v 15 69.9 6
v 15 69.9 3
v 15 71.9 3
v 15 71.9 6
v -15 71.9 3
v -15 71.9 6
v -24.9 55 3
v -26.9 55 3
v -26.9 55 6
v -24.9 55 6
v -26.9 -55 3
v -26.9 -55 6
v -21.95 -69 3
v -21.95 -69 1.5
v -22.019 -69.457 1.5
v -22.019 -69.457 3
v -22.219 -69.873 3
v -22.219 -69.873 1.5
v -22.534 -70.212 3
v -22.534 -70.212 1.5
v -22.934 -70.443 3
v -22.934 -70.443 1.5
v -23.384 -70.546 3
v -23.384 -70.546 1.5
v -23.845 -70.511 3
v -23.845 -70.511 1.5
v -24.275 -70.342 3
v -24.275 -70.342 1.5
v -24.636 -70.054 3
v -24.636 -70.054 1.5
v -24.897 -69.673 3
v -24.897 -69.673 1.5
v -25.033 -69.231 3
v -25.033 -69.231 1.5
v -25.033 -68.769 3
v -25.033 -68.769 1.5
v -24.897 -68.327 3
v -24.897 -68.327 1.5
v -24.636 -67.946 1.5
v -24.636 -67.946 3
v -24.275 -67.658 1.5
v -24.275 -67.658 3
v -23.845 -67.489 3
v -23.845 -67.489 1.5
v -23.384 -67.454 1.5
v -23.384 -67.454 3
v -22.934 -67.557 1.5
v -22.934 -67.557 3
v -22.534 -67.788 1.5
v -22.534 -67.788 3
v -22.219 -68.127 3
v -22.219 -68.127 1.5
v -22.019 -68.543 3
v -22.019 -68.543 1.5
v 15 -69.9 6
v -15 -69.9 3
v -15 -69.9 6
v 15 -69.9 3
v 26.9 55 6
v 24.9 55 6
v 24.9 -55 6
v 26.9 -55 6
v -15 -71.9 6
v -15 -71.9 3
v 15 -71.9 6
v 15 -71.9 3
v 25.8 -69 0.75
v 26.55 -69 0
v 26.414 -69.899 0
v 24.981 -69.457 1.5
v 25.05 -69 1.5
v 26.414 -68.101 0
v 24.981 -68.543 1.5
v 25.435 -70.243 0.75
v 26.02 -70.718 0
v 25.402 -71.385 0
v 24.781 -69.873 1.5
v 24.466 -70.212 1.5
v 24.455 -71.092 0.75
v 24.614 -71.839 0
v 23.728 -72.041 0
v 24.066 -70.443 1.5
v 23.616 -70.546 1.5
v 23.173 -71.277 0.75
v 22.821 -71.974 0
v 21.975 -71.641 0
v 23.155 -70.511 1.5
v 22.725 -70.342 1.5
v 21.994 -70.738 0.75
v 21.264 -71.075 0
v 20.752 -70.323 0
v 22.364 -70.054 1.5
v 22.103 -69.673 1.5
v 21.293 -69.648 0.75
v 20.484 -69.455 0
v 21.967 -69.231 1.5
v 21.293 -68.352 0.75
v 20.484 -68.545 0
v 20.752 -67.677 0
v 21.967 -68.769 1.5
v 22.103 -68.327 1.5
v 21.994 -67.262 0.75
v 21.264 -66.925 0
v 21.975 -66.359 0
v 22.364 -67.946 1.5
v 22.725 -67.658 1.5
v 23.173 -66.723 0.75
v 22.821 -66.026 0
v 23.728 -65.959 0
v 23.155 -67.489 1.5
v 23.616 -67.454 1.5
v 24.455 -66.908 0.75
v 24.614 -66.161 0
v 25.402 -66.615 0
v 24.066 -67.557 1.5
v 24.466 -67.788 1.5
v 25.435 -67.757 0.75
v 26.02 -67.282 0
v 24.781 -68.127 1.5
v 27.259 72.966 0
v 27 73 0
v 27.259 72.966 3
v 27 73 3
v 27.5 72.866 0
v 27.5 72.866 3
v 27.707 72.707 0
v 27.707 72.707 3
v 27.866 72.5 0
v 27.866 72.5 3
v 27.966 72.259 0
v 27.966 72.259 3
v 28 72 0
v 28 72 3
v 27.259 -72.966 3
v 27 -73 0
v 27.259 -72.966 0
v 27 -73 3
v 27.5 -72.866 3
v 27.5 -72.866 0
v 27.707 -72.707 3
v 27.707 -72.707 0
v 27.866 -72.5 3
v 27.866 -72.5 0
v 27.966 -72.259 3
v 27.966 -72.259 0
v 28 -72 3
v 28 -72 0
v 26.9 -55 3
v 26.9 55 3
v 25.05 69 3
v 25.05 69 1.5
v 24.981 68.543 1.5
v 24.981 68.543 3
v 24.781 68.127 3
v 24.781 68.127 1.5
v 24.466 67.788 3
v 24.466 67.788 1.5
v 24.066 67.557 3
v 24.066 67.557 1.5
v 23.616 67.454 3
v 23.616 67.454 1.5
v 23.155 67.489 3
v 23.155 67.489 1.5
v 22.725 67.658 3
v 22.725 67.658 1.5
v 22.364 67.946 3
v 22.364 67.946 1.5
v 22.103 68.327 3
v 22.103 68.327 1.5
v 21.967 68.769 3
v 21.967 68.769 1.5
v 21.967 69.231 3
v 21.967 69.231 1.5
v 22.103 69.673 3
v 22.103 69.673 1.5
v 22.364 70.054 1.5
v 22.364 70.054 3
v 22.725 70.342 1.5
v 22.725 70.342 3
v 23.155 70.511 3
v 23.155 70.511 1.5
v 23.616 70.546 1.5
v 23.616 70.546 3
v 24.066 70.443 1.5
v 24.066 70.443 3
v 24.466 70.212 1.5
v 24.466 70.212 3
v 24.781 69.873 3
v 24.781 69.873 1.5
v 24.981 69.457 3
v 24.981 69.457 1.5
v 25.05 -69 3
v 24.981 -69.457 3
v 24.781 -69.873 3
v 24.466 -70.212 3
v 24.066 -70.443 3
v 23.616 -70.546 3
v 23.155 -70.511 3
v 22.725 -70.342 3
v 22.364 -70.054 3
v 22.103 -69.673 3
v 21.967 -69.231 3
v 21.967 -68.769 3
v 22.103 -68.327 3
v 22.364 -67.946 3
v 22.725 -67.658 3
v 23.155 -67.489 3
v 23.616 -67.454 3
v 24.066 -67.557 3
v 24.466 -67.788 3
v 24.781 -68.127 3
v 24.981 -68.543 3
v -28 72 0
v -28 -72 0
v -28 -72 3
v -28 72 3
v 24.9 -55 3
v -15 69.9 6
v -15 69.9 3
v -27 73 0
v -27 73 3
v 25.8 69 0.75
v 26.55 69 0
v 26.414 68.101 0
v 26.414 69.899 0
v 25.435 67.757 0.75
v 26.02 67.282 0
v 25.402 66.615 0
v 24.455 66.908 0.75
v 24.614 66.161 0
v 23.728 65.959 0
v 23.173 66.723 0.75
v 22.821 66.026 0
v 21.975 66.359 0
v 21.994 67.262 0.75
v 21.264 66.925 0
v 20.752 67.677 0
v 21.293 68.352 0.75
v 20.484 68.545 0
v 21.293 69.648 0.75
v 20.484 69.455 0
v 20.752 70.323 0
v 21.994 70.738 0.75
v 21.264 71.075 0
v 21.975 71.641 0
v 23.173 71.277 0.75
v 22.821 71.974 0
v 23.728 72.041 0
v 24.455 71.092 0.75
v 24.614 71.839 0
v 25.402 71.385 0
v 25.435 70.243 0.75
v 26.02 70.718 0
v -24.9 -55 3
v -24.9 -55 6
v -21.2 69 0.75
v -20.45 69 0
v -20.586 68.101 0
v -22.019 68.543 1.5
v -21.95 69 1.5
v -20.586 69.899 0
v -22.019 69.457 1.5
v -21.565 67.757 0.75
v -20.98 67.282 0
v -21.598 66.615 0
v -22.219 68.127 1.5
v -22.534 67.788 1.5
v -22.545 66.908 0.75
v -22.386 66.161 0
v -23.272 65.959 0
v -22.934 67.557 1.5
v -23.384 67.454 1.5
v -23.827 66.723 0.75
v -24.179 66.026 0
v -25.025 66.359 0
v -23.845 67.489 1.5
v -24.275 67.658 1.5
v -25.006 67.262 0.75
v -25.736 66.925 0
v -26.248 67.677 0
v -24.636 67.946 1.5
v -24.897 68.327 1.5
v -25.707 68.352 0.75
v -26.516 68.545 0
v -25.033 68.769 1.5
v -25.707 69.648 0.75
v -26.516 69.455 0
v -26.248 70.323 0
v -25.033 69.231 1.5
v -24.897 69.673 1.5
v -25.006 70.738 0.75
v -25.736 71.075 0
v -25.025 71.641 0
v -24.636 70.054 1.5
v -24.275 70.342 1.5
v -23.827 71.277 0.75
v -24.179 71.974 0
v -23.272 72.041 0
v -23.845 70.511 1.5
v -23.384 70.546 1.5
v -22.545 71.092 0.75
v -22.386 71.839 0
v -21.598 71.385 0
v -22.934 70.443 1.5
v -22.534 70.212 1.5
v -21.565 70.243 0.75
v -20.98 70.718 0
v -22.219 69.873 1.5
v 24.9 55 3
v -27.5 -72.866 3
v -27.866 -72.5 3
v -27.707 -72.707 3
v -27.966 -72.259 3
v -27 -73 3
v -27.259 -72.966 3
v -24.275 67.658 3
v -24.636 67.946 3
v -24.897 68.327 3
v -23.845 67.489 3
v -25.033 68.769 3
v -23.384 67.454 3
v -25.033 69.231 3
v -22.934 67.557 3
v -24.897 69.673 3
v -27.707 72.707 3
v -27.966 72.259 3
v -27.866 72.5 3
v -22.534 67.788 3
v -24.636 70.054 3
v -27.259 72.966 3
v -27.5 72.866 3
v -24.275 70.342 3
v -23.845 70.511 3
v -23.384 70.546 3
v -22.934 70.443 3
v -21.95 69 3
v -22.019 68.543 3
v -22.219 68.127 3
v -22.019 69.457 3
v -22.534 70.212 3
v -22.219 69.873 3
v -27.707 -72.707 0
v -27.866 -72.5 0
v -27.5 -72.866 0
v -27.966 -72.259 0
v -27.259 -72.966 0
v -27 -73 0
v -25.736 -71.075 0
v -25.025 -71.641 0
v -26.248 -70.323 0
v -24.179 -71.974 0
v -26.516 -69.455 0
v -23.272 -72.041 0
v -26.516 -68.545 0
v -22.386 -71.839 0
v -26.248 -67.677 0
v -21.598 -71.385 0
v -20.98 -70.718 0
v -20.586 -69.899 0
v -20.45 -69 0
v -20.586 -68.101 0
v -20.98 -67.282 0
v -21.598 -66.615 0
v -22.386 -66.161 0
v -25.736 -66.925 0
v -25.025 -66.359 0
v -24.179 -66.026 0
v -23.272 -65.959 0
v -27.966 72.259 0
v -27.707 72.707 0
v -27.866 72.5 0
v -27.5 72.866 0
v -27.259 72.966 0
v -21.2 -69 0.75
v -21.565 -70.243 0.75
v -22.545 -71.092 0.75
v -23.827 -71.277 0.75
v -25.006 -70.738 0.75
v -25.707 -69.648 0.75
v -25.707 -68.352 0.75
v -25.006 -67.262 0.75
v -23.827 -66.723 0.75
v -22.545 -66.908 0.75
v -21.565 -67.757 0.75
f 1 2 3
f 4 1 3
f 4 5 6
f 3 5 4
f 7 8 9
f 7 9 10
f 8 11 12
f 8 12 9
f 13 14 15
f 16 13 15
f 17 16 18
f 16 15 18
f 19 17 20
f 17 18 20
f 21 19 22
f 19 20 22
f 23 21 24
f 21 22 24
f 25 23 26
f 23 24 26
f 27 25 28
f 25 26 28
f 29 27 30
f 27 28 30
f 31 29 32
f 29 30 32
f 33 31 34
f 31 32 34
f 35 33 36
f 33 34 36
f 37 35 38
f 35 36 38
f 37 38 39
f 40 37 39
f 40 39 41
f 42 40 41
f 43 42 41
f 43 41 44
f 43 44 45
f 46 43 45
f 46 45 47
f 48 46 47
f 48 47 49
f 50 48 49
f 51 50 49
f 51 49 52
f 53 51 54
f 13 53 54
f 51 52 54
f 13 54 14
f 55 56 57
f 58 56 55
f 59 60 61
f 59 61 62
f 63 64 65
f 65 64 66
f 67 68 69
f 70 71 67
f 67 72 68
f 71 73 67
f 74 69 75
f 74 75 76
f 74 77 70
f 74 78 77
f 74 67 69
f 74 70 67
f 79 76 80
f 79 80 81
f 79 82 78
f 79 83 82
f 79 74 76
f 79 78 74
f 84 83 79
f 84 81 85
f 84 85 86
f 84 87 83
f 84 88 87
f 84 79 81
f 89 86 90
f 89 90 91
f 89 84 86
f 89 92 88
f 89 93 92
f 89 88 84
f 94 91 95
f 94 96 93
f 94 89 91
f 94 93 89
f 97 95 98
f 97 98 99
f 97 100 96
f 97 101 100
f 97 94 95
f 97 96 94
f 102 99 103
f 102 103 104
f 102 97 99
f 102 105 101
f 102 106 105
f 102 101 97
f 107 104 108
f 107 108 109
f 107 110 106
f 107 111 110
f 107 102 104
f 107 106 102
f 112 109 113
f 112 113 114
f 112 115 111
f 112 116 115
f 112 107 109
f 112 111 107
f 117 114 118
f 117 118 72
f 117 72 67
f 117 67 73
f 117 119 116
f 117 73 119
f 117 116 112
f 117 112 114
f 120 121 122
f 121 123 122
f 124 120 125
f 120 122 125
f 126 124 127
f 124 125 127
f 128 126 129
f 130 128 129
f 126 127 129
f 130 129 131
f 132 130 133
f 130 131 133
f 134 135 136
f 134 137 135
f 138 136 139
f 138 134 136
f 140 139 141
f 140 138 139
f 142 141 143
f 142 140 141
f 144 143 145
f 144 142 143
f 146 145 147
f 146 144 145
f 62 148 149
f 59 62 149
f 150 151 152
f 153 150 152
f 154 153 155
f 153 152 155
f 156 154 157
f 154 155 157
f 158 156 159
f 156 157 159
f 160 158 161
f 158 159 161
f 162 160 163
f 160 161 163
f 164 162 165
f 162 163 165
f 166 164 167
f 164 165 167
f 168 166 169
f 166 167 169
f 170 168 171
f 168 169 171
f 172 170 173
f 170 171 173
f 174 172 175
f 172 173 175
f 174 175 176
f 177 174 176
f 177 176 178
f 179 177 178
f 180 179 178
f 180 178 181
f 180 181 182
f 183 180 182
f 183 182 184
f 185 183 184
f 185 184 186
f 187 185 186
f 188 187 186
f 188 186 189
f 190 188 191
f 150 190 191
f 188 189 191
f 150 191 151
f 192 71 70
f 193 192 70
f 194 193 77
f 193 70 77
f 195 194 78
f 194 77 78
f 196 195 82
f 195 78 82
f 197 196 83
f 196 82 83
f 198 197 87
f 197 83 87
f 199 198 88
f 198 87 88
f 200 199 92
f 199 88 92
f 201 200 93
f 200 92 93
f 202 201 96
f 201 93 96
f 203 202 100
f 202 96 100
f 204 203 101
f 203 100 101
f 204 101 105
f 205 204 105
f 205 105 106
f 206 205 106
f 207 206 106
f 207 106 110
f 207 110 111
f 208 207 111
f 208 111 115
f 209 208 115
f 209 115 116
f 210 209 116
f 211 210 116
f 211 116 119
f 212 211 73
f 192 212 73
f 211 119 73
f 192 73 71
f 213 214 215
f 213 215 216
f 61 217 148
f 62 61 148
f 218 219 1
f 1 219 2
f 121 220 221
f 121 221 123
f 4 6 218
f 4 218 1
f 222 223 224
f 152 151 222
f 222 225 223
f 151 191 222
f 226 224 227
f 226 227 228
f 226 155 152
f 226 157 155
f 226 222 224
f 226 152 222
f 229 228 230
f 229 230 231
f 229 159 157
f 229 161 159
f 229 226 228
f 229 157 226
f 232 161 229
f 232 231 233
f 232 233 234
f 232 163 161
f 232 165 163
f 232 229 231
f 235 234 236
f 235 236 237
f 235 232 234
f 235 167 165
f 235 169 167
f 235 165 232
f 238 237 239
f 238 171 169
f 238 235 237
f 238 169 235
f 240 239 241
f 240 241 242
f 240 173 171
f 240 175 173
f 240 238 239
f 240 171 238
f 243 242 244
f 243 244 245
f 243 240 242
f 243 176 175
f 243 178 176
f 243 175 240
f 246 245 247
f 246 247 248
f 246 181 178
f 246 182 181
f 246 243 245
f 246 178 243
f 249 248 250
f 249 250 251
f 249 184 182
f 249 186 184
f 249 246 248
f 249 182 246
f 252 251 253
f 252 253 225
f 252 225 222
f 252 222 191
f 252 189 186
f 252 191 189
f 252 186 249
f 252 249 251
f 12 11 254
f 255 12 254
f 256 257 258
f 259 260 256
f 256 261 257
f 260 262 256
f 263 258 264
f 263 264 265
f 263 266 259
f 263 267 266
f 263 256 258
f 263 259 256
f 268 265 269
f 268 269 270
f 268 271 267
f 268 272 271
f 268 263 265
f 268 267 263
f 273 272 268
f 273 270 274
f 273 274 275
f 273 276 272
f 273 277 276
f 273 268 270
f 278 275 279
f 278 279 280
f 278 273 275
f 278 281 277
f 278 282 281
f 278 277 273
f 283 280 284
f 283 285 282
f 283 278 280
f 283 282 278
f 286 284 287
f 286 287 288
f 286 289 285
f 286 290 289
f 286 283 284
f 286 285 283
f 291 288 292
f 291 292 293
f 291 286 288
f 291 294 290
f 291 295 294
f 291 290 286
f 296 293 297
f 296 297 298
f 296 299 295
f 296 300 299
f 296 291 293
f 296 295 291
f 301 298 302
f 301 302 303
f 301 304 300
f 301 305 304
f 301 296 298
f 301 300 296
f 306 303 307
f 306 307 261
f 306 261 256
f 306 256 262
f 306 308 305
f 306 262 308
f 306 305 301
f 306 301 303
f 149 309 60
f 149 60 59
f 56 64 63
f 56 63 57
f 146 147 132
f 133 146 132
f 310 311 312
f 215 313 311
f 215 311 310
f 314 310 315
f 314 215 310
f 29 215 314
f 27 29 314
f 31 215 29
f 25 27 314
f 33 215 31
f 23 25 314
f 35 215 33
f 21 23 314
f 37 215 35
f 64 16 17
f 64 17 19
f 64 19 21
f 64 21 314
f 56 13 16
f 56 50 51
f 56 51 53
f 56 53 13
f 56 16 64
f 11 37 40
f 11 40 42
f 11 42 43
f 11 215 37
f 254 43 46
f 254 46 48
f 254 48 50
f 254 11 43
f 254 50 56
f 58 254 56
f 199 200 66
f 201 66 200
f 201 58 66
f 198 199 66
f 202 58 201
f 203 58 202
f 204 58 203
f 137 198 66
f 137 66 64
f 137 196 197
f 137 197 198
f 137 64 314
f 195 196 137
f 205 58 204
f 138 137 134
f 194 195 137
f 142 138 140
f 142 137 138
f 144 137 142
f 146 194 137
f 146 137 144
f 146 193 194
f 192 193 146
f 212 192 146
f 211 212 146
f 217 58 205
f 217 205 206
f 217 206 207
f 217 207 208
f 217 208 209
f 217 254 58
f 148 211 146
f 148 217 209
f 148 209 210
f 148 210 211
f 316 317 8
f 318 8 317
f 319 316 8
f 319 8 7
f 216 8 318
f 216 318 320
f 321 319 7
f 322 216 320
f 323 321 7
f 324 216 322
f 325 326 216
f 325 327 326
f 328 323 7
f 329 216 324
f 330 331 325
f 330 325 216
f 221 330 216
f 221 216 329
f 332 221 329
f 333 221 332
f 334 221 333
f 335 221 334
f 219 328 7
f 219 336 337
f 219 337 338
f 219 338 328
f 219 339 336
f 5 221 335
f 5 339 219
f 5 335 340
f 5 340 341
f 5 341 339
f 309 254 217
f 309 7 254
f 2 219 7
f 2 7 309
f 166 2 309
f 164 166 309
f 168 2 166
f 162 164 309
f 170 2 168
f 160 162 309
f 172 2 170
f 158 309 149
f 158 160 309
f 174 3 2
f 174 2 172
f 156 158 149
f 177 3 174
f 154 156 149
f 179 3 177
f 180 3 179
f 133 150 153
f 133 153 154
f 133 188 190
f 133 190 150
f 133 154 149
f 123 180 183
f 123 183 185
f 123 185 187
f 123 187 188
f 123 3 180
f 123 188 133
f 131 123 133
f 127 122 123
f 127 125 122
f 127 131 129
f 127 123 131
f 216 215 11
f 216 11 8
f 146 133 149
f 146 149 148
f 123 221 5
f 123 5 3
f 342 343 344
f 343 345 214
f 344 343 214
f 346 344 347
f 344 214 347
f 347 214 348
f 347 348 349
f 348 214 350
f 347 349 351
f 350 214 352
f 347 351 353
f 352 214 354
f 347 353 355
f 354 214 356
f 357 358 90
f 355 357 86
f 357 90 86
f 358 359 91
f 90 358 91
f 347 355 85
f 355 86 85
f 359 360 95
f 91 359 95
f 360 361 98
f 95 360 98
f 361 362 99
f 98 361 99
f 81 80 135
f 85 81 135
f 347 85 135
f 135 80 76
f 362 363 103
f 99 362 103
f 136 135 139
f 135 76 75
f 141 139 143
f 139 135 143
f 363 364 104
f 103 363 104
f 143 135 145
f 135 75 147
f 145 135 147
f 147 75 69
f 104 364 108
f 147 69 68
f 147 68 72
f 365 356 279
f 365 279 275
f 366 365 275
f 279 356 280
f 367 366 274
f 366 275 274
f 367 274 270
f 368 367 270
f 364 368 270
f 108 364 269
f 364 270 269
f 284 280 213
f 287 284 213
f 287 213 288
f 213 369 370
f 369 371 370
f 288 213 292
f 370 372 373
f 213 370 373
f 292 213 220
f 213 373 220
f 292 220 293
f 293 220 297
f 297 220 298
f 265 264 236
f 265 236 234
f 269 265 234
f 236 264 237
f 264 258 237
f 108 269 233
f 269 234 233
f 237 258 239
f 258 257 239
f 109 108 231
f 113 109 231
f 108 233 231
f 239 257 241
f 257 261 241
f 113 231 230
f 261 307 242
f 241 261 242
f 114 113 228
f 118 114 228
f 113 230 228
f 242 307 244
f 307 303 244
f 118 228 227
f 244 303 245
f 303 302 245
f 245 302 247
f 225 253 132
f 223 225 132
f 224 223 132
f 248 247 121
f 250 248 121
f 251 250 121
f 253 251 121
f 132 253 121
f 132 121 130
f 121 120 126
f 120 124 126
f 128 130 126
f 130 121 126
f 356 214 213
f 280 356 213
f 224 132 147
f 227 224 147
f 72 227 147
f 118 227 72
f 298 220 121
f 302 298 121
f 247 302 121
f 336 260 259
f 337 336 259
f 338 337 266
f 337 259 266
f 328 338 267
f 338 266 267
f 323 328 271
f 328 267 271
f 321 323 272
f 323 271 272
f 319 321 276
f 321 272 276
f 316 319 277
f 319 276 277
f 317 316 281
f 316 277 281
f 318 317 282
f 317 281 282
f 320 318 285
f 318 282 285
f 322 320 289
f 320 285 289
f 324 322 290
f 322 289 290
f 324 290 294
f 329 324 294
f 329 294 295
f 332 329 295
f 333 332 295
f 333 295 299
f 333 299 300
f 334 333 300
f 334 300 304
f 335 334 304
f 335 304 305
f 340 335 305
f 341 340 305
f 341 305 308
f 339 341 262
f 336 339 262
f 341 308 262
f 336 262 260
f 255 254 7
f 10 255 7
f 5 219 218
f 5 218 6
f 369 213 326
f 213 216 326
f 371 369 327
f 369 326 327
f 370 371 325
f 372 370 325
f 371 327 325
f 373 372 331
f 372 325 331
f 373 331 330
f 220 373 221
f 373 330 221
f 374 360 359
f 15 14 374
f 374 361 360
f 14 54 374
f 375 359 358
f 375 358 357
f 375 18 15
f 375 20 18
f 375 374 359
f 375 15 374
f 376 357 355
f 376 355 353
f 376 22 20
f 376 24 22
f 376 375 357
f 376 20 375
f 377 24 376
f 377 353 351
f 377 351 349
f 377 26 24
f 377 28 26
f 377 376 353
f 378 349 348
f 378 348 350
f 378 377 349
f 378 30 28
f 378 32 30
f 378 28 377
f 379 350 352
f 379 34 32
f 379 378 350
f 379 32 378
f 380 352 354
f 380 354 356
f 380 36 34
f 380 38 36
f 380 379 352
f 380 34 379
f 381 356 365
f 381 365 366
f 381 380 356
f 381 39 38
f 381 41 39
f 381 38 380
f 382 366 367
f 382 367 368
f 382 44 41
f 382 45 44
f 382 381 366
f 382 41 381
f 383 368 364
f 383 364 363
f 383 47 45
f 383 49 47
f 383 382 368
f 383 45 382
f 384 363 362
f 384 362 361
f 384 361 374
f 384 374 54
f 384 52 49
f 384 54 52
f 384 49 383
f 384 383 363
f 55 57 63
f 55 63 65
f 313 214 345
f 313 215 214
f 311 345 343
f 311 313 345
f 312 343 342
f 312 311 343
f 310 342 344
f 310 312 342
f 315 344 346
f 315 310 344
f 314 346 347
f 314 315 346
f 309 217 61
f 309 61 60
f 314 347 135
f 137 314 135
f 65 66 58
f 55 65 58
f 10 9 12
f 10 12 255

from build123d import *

# Parameters (mm, degrees)
SKETCH_W      = 56
SKETCH_H      = 146
PAD_DEPTH     = 3
SKETCH001_W   = 2
SKETCH001_H   = 110
SKETCH001_W_2 = 30
SKETCH001_H_2 = 2
PAD001_DEPTH  = 3
SKETCH002_R   = 1.55
POCKET_DEPTH  = 3
CHAMFER_SIZE  = 1.5
FILLET_R      = 1


with BuildPart() as part:
    # Sketch → Pad (new body)
    with BuildSketch(Plane.XY):
        Rectangle(SKETCH_W, SKETCH_H)
    extrude(amount=PAD_DEPTH)

    # Sketch001 (on Face6 of Pad) → Pad001 (join)
    with BuildSketch(Plane.XY.offset(3)):
        with Locations((-25.9, 0)):
            Rectangle(SKETCH001_W, SKETCH001_H)
        with Locations((25.9, 0)):
            Rectangle(SKETCH001_W, SKETCH001_H)
        with Locations((0, 70.9)):
            Rectangle(SKETCH001_W_2, SKETCH001_H_2)
        with Locations((0, -70.9)):
            Rectangle(SKETCH001_W_2, SKETCH001_H_2)
    extrude(amount=PAD001_DEPTH)

    # Sketch002 (on Face4 of Pad001) → Pocket (cut)
    with BuildSketch(Plane(origin=(0, 0, 0), x_dir=(1, 0, 0), z_dir=(0, 0, -1))):
        with Locations((-23.5, 69)):
            Circle(SKETCH002_R)
        with Locations((23.5, 69)):
            Circle(SKETCH002_R)
        with Locations((-23.5, -69)):
            Circle(SKETCH002_R)
        with Locations((23.5, -69)):
            Circle(SKETCH002_R)
    extrude(amount=-POCKET_DEPTH, mode=Mode.SUBTRACT)

    # Chamfer
    chamfer_edges = [part.edges().sort_by_distance(p)[0] for p in [
        (-25.05, -69, 0),
        (21.95, -69, 0),
        (-25.05, 69, 0),
        (21.95, 69, 0),
    ]]
    chamfer(chamfer_edges, length=CHAMFER_SIZE)

    # Fillet
    fillet_edges = [part.edges().sort_by_distance(p)[0] for p in [
        (-28, -73, 1.5),
        (28, -73, 1.5),
        (-28, 73, 1.5),
        (28, 73, 1.5),
    ]]
    fillet(fillet_edges, radius=FILLET_R)


solid = part.part
